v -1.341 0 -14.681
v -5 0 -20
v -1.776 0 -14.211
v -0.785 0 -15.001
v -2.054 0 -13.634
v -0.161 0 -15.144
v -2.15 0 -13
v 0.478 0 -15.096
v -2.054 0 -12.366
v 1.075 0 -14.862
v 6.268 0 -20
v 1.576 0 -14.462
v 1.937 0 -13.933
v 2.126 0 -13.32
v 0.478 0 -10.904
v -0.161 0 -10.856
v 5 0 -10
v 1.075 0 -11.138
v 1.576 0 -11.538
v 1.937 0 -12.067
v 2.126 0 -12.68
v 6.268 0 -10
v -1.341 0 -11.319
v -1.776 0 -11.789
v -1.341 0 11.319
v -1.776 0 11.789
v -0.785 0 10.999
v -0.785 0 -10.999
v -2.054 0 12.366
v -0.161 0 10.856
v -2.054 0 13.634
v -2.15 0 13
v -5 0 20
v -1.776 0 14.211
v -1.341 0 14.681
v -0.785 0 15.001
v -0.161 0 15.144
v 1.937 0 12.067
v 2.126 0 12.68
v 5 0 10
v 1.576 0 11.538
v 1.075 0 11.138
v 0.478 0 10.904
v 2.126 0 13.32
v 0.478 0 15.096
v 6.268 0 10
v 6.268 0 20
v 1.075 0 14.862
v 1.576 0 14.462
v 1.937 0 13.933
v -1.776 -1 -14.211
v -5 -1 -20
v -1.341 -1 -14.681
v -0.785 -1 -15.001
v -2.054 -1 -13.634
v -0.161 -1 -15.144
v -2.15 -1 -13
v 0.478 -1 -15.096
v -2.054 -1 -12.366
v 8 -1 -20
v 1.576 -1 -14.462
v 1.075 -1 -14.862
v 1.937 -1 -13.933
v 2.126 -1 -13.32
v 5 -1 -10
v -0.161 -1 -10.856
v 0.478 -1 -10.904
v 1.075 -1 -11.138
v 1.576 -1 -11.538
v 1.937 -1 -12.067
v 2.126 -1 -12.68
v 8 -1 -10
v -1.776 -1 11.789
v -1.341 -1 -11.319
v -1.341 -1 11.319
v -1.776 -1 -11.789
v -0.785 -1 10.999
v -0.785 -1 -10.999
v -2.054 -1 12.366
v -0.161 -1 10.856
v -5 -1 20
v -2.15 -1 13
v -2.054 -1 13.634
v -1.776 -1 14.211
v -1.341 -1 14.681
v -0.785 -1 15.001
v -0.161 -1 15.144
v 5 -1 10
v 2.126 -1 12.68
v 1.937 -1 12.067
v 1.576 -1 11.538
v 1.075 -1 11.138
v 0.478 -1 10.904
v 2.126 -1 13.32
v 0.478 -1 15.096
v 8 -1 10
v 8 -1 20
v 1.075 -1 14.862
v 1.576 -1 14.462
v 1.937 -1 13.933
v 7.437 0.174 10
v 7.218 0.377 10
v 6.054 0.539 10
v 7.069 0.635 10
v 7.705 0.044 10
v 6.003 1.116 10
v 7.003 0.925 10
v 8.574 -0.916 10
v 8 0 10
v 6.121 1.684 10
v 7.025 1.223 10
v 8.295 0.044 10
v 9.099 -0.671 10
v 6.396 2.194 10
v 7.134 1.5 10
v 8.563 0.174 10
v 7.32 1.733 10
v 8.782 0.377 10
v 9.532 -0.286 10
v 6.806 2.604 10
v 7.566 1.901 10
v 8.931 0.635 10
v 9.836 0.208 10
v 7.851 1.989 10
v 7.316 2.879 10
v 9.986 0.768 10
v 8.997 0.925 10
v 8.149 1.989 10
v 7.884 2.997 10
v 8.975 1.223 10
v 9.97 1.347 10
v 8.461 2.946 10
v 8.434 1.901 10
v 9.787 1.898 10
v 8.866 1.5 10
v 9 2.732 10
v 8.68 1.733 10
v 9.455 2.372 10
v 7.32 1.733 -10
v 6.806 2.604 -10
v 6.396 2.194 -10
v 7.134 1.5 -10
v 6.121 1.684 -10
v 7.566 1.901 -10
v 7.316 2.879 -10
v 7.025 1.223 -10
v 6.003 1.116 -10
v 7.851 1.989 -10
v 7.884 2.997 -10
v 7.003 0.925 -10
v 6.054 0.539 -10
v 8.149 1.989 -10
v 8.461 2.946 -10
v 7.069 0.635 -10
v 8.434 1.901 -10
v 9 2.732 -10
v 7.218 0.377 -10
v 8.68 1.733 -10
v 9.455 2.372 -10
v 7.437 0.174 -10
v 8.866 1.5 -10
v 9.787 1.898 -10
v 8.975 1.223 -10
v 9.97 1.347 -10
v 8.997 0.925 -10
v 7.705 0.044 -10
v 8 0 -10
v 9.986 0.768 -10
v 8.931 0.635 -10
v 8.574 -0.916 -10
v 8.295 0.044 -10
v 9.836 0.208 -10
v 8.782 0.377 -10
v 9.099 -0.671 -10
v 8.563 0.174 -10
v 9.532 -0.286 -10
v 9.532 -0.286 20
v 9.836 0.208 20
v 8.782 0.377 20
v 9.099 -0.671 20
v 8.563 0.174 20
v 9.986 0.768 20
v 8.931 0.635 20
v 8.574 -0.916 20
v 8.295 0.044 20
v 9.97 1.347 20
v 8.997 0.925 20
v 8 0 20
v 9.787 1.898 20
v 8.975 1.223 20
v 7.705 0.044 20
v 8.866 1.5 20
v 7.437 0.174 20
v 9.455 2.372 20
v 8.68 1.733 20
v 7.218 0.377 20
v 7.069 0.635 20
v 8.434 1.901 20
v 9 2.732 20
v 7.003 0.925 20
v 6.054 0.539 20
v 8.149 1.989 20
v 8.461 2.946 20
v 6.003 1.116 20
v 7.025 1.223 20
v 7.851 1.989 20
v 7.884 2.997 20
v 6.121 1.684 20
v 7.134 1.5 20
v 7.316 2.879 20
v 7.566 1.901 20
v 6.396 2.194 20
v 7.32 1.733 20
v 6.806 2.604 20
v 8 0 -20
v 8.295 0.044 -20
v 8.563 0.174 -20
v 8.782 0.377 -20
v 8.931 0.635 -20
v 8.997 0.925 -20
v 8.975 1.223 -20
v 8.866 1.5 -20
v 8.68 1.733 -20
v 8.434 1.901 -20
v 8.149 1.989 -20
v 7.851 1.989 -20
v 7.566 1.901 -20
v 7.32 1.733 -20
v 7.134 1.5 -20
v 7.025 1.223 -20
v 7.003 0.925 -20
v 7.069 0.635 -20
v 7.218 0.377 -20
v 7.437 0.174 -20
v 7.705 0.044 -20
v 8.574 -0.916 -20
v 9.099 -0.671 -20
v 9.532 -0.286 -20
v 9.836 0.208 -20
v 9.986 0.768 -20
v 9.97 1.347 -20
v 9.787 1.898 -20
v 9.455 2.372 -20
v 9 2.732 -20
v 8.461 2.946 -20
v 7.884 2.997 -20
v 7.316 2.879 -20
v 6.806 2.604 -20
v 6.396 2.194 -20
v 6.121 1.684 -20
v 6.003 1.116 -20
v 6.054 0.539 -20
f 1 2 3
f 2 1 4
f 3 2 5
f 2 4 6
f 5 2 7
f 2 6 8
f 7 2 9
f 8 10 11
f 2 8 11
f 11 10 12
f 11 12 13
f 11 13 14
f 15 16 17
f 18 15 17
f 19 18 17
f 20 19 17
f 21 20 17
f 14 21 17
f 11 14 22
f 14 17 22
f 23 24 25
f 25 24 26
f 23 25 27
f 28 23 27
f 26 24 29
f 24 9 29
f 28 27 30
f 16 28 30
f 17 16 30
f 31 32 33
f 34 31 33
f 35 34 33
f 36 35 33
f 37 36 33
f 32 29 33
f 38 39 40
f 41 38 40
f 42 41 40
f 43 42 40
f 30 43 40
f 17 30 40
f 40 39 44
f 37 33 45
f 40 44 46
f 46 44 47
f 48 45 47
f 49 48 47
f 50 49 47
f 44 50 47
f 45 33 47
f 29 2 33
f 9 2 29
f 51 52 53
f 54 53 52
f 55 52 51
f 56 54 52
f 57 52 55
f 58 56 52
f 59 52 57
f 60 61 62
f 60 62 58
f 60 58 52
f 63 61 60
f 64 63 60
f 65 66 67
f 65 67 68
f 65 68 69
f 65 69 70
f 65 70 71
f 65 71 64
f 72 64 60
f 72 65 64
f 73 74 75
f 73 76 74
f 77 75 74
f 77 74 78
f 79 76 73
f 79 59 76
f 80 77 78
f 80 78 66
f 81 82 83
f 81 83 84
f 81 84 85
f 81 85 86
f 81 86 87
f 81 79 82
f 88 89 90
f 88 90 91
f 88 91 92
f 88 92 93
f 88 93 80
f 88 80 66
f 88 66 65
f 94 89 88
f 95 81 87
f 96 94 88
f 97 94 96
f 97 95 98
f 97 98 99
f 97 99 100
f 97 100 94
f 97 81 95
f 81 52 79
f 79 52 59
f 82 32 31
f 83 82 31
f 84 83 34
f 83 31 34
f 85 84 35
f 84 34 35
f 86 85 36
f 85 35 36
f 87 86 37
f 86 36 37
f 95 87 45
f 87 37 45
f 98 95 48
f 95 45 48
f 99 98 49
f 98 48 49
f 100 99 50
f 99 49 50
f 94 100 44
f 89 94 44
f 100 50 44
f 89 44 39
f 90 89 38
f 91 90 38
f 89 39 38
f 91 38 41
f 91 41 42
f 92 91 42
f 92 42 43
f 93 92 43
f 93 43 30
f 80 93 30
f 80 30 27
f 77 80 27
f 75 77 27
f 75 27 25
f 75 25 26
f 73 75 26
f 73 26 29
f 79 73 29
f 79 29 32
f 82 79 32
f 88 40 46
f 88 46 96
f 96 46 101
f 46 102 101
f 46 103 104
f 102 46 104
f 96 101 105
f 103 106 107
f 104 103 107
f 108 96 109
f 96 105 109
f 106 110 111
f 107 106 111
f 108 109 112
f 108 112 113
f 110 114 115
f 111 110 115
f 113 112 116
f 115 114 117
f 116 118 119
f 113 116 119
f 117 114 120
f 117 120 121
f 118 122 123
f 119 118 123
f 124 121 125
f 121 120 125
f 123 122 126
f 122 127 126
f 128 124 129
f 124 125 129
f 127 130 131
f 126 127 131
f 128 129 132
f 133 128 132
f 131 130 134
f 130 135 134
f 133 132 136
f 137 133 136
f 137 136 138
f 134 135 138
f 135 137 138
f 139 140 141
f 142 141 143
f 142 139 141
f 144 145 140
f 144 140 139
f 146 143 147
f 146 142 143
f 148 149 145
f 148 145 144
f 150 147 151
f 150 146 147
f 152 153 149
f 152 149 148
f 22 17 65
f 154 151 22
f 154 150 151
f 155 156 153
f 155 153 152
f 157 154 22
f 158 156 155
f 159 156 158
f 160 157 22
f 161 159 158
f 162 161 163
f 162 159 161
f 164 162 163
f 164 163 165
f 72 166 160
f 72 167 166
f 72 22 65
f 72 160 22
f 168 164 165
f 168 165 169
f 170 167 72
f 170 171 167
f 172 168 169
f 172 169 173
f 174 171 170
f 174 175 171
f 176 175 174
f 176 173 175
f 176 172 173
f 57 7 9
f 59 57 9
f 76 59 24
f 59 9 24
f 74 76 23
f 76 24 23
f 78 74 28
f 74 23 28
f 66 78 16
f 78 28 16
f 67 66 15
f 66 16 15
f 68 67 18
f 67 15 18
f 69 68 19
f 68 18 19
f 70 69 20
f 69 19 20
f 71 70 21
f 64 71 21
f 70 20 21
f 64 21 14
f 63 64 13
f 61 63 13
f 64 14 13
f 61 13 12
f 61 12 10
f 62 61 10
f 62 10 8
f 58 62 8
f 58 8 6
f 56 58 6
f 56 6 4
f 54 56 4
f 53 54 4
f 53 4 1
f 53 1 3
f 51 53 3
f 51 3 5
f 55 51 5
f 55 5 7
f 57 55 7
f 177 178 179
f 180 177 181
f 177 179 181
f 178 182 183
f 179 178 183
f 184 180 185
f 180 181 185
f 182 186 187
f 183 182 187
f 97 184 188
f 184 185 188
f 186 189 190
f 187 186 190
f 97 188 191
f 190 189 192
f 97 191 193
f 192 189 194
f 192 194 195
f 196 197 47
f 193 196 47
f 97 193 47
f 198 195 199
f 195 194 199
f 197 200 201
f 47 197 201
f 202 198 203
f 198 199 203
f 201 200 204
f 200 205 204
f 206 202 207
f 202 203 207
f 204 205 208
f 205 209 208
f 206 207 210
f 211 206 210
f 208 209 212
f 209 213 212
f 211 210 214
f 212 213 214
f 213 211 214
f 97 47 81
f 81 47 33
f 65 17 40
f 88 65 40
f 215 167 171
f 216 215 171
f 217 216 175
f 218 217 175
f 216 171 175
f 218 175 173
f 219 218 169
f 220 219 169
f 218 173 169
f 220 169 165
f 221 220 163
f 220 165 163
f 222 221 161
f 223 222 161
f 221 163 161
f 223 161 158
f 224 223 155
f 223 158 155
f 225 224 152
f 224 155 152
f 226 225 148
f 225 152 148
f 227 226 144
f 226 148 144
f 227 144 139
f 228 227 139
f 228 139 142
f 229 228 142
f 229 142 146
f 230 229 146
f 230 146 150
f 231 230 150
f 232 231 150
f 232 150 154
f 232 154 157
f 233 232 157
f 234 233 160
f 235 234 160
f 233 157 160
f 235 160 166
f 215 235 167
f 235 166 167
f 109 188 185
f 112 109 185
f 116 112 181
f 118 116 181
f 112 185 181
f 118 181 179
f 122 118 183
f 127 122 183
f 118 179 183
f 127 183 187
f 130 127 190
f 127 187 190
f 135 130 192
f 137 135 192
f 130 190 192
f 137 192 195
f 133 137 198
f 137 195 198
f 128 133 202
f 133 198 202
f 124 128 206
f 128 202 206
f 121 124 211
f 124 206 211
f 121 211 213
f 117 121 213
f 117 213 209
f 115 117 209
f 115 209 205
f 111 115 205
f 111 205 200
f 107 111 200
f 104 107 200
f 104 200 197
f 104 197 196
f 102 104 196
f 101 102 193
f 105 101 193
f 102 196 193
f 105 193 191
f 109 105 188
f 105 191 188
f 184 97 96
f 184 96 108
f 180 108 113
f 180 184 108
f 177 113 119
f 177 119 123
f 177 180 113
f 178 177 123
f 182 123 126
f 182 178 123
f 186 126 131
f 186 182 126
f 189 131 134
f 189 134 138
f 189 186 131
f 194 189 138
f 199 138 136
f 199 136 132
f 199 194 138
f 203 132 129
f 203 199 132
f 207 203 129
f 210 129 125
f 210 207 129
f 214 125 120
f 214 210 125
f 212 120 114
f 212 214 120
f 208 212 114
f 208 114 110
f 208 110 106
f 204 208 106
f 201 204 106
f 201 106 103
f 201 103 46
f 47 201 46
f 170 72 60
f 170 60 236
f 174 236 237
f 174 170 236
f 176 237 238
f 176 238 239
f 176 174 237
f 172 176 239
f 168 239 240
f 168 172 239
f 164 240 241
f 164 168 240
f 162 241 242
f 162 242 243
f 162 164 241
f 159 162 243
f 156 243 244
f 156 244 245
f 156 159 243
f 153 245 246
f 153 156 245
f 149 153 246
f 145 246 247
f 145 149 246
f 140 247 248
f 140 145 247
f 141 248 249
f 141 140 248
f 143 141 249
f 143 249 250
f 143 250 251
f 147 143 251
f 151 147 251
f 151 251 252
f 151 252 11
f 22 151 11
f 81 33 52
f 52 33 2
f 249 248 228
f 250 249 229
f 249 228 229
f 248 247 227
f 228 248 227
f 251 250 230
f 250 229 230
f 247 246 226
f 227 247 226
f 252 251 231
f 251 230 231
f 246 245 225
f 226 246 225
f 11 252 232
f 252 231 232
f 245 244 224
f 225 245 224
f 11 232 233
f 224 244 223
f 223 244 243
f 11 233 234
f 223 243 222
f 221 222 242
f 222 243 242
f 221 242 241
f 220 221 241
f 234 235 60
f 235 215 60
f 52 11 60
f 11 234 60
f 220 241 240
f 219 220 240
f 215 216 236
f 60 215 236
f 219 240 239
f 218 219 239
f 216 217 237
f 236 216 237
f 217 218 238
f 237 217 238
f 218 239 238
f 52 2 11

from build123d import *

# Parameters (mm, degrees)
F0_W     = 3
F0_H     = 10
F1_DEPTH = 1
F2_W     = 1
F2_H     = 10
F5_D     = 4.3
F5_DEPTH = 2.5


with BuildPart() as f1:
    # F0 (on Front) → F1 (new body)
    with BuildSketch(Plane.XZ):
        Polygon((5, 10), (5, 20), (-5, 20), (-5, -20), (5, -20), (5, -10), align=None)
        with Locations((6.5, -15)):
            Rectangle(F0_W, F0_H)
        with Locations((6.5, 15)):
            Rectangle(F0_W, F0_H)
    extrude(amount=F1_DEPTH)

    # F2 (on face) → F3 (revolve)
    with BuildSketch(Plane.YZ.offset(8)):
        with Locations((-0.5, -15)):
            Rectangle(F2_W, F2_H)
        with Locations((-0.5, 15)):
            Rectangle(F2_W, F2_H)
    revolve(axis=Axis((8, 1, 0), (0, 0, 1)))

    # F5
    with Locations(Plane.XZ.offset(1)):
        with Locations((0, 13), (0, -13)):
            Hole(F5_D / 2, depth=F5_DEPTH)


solid = f1.part
